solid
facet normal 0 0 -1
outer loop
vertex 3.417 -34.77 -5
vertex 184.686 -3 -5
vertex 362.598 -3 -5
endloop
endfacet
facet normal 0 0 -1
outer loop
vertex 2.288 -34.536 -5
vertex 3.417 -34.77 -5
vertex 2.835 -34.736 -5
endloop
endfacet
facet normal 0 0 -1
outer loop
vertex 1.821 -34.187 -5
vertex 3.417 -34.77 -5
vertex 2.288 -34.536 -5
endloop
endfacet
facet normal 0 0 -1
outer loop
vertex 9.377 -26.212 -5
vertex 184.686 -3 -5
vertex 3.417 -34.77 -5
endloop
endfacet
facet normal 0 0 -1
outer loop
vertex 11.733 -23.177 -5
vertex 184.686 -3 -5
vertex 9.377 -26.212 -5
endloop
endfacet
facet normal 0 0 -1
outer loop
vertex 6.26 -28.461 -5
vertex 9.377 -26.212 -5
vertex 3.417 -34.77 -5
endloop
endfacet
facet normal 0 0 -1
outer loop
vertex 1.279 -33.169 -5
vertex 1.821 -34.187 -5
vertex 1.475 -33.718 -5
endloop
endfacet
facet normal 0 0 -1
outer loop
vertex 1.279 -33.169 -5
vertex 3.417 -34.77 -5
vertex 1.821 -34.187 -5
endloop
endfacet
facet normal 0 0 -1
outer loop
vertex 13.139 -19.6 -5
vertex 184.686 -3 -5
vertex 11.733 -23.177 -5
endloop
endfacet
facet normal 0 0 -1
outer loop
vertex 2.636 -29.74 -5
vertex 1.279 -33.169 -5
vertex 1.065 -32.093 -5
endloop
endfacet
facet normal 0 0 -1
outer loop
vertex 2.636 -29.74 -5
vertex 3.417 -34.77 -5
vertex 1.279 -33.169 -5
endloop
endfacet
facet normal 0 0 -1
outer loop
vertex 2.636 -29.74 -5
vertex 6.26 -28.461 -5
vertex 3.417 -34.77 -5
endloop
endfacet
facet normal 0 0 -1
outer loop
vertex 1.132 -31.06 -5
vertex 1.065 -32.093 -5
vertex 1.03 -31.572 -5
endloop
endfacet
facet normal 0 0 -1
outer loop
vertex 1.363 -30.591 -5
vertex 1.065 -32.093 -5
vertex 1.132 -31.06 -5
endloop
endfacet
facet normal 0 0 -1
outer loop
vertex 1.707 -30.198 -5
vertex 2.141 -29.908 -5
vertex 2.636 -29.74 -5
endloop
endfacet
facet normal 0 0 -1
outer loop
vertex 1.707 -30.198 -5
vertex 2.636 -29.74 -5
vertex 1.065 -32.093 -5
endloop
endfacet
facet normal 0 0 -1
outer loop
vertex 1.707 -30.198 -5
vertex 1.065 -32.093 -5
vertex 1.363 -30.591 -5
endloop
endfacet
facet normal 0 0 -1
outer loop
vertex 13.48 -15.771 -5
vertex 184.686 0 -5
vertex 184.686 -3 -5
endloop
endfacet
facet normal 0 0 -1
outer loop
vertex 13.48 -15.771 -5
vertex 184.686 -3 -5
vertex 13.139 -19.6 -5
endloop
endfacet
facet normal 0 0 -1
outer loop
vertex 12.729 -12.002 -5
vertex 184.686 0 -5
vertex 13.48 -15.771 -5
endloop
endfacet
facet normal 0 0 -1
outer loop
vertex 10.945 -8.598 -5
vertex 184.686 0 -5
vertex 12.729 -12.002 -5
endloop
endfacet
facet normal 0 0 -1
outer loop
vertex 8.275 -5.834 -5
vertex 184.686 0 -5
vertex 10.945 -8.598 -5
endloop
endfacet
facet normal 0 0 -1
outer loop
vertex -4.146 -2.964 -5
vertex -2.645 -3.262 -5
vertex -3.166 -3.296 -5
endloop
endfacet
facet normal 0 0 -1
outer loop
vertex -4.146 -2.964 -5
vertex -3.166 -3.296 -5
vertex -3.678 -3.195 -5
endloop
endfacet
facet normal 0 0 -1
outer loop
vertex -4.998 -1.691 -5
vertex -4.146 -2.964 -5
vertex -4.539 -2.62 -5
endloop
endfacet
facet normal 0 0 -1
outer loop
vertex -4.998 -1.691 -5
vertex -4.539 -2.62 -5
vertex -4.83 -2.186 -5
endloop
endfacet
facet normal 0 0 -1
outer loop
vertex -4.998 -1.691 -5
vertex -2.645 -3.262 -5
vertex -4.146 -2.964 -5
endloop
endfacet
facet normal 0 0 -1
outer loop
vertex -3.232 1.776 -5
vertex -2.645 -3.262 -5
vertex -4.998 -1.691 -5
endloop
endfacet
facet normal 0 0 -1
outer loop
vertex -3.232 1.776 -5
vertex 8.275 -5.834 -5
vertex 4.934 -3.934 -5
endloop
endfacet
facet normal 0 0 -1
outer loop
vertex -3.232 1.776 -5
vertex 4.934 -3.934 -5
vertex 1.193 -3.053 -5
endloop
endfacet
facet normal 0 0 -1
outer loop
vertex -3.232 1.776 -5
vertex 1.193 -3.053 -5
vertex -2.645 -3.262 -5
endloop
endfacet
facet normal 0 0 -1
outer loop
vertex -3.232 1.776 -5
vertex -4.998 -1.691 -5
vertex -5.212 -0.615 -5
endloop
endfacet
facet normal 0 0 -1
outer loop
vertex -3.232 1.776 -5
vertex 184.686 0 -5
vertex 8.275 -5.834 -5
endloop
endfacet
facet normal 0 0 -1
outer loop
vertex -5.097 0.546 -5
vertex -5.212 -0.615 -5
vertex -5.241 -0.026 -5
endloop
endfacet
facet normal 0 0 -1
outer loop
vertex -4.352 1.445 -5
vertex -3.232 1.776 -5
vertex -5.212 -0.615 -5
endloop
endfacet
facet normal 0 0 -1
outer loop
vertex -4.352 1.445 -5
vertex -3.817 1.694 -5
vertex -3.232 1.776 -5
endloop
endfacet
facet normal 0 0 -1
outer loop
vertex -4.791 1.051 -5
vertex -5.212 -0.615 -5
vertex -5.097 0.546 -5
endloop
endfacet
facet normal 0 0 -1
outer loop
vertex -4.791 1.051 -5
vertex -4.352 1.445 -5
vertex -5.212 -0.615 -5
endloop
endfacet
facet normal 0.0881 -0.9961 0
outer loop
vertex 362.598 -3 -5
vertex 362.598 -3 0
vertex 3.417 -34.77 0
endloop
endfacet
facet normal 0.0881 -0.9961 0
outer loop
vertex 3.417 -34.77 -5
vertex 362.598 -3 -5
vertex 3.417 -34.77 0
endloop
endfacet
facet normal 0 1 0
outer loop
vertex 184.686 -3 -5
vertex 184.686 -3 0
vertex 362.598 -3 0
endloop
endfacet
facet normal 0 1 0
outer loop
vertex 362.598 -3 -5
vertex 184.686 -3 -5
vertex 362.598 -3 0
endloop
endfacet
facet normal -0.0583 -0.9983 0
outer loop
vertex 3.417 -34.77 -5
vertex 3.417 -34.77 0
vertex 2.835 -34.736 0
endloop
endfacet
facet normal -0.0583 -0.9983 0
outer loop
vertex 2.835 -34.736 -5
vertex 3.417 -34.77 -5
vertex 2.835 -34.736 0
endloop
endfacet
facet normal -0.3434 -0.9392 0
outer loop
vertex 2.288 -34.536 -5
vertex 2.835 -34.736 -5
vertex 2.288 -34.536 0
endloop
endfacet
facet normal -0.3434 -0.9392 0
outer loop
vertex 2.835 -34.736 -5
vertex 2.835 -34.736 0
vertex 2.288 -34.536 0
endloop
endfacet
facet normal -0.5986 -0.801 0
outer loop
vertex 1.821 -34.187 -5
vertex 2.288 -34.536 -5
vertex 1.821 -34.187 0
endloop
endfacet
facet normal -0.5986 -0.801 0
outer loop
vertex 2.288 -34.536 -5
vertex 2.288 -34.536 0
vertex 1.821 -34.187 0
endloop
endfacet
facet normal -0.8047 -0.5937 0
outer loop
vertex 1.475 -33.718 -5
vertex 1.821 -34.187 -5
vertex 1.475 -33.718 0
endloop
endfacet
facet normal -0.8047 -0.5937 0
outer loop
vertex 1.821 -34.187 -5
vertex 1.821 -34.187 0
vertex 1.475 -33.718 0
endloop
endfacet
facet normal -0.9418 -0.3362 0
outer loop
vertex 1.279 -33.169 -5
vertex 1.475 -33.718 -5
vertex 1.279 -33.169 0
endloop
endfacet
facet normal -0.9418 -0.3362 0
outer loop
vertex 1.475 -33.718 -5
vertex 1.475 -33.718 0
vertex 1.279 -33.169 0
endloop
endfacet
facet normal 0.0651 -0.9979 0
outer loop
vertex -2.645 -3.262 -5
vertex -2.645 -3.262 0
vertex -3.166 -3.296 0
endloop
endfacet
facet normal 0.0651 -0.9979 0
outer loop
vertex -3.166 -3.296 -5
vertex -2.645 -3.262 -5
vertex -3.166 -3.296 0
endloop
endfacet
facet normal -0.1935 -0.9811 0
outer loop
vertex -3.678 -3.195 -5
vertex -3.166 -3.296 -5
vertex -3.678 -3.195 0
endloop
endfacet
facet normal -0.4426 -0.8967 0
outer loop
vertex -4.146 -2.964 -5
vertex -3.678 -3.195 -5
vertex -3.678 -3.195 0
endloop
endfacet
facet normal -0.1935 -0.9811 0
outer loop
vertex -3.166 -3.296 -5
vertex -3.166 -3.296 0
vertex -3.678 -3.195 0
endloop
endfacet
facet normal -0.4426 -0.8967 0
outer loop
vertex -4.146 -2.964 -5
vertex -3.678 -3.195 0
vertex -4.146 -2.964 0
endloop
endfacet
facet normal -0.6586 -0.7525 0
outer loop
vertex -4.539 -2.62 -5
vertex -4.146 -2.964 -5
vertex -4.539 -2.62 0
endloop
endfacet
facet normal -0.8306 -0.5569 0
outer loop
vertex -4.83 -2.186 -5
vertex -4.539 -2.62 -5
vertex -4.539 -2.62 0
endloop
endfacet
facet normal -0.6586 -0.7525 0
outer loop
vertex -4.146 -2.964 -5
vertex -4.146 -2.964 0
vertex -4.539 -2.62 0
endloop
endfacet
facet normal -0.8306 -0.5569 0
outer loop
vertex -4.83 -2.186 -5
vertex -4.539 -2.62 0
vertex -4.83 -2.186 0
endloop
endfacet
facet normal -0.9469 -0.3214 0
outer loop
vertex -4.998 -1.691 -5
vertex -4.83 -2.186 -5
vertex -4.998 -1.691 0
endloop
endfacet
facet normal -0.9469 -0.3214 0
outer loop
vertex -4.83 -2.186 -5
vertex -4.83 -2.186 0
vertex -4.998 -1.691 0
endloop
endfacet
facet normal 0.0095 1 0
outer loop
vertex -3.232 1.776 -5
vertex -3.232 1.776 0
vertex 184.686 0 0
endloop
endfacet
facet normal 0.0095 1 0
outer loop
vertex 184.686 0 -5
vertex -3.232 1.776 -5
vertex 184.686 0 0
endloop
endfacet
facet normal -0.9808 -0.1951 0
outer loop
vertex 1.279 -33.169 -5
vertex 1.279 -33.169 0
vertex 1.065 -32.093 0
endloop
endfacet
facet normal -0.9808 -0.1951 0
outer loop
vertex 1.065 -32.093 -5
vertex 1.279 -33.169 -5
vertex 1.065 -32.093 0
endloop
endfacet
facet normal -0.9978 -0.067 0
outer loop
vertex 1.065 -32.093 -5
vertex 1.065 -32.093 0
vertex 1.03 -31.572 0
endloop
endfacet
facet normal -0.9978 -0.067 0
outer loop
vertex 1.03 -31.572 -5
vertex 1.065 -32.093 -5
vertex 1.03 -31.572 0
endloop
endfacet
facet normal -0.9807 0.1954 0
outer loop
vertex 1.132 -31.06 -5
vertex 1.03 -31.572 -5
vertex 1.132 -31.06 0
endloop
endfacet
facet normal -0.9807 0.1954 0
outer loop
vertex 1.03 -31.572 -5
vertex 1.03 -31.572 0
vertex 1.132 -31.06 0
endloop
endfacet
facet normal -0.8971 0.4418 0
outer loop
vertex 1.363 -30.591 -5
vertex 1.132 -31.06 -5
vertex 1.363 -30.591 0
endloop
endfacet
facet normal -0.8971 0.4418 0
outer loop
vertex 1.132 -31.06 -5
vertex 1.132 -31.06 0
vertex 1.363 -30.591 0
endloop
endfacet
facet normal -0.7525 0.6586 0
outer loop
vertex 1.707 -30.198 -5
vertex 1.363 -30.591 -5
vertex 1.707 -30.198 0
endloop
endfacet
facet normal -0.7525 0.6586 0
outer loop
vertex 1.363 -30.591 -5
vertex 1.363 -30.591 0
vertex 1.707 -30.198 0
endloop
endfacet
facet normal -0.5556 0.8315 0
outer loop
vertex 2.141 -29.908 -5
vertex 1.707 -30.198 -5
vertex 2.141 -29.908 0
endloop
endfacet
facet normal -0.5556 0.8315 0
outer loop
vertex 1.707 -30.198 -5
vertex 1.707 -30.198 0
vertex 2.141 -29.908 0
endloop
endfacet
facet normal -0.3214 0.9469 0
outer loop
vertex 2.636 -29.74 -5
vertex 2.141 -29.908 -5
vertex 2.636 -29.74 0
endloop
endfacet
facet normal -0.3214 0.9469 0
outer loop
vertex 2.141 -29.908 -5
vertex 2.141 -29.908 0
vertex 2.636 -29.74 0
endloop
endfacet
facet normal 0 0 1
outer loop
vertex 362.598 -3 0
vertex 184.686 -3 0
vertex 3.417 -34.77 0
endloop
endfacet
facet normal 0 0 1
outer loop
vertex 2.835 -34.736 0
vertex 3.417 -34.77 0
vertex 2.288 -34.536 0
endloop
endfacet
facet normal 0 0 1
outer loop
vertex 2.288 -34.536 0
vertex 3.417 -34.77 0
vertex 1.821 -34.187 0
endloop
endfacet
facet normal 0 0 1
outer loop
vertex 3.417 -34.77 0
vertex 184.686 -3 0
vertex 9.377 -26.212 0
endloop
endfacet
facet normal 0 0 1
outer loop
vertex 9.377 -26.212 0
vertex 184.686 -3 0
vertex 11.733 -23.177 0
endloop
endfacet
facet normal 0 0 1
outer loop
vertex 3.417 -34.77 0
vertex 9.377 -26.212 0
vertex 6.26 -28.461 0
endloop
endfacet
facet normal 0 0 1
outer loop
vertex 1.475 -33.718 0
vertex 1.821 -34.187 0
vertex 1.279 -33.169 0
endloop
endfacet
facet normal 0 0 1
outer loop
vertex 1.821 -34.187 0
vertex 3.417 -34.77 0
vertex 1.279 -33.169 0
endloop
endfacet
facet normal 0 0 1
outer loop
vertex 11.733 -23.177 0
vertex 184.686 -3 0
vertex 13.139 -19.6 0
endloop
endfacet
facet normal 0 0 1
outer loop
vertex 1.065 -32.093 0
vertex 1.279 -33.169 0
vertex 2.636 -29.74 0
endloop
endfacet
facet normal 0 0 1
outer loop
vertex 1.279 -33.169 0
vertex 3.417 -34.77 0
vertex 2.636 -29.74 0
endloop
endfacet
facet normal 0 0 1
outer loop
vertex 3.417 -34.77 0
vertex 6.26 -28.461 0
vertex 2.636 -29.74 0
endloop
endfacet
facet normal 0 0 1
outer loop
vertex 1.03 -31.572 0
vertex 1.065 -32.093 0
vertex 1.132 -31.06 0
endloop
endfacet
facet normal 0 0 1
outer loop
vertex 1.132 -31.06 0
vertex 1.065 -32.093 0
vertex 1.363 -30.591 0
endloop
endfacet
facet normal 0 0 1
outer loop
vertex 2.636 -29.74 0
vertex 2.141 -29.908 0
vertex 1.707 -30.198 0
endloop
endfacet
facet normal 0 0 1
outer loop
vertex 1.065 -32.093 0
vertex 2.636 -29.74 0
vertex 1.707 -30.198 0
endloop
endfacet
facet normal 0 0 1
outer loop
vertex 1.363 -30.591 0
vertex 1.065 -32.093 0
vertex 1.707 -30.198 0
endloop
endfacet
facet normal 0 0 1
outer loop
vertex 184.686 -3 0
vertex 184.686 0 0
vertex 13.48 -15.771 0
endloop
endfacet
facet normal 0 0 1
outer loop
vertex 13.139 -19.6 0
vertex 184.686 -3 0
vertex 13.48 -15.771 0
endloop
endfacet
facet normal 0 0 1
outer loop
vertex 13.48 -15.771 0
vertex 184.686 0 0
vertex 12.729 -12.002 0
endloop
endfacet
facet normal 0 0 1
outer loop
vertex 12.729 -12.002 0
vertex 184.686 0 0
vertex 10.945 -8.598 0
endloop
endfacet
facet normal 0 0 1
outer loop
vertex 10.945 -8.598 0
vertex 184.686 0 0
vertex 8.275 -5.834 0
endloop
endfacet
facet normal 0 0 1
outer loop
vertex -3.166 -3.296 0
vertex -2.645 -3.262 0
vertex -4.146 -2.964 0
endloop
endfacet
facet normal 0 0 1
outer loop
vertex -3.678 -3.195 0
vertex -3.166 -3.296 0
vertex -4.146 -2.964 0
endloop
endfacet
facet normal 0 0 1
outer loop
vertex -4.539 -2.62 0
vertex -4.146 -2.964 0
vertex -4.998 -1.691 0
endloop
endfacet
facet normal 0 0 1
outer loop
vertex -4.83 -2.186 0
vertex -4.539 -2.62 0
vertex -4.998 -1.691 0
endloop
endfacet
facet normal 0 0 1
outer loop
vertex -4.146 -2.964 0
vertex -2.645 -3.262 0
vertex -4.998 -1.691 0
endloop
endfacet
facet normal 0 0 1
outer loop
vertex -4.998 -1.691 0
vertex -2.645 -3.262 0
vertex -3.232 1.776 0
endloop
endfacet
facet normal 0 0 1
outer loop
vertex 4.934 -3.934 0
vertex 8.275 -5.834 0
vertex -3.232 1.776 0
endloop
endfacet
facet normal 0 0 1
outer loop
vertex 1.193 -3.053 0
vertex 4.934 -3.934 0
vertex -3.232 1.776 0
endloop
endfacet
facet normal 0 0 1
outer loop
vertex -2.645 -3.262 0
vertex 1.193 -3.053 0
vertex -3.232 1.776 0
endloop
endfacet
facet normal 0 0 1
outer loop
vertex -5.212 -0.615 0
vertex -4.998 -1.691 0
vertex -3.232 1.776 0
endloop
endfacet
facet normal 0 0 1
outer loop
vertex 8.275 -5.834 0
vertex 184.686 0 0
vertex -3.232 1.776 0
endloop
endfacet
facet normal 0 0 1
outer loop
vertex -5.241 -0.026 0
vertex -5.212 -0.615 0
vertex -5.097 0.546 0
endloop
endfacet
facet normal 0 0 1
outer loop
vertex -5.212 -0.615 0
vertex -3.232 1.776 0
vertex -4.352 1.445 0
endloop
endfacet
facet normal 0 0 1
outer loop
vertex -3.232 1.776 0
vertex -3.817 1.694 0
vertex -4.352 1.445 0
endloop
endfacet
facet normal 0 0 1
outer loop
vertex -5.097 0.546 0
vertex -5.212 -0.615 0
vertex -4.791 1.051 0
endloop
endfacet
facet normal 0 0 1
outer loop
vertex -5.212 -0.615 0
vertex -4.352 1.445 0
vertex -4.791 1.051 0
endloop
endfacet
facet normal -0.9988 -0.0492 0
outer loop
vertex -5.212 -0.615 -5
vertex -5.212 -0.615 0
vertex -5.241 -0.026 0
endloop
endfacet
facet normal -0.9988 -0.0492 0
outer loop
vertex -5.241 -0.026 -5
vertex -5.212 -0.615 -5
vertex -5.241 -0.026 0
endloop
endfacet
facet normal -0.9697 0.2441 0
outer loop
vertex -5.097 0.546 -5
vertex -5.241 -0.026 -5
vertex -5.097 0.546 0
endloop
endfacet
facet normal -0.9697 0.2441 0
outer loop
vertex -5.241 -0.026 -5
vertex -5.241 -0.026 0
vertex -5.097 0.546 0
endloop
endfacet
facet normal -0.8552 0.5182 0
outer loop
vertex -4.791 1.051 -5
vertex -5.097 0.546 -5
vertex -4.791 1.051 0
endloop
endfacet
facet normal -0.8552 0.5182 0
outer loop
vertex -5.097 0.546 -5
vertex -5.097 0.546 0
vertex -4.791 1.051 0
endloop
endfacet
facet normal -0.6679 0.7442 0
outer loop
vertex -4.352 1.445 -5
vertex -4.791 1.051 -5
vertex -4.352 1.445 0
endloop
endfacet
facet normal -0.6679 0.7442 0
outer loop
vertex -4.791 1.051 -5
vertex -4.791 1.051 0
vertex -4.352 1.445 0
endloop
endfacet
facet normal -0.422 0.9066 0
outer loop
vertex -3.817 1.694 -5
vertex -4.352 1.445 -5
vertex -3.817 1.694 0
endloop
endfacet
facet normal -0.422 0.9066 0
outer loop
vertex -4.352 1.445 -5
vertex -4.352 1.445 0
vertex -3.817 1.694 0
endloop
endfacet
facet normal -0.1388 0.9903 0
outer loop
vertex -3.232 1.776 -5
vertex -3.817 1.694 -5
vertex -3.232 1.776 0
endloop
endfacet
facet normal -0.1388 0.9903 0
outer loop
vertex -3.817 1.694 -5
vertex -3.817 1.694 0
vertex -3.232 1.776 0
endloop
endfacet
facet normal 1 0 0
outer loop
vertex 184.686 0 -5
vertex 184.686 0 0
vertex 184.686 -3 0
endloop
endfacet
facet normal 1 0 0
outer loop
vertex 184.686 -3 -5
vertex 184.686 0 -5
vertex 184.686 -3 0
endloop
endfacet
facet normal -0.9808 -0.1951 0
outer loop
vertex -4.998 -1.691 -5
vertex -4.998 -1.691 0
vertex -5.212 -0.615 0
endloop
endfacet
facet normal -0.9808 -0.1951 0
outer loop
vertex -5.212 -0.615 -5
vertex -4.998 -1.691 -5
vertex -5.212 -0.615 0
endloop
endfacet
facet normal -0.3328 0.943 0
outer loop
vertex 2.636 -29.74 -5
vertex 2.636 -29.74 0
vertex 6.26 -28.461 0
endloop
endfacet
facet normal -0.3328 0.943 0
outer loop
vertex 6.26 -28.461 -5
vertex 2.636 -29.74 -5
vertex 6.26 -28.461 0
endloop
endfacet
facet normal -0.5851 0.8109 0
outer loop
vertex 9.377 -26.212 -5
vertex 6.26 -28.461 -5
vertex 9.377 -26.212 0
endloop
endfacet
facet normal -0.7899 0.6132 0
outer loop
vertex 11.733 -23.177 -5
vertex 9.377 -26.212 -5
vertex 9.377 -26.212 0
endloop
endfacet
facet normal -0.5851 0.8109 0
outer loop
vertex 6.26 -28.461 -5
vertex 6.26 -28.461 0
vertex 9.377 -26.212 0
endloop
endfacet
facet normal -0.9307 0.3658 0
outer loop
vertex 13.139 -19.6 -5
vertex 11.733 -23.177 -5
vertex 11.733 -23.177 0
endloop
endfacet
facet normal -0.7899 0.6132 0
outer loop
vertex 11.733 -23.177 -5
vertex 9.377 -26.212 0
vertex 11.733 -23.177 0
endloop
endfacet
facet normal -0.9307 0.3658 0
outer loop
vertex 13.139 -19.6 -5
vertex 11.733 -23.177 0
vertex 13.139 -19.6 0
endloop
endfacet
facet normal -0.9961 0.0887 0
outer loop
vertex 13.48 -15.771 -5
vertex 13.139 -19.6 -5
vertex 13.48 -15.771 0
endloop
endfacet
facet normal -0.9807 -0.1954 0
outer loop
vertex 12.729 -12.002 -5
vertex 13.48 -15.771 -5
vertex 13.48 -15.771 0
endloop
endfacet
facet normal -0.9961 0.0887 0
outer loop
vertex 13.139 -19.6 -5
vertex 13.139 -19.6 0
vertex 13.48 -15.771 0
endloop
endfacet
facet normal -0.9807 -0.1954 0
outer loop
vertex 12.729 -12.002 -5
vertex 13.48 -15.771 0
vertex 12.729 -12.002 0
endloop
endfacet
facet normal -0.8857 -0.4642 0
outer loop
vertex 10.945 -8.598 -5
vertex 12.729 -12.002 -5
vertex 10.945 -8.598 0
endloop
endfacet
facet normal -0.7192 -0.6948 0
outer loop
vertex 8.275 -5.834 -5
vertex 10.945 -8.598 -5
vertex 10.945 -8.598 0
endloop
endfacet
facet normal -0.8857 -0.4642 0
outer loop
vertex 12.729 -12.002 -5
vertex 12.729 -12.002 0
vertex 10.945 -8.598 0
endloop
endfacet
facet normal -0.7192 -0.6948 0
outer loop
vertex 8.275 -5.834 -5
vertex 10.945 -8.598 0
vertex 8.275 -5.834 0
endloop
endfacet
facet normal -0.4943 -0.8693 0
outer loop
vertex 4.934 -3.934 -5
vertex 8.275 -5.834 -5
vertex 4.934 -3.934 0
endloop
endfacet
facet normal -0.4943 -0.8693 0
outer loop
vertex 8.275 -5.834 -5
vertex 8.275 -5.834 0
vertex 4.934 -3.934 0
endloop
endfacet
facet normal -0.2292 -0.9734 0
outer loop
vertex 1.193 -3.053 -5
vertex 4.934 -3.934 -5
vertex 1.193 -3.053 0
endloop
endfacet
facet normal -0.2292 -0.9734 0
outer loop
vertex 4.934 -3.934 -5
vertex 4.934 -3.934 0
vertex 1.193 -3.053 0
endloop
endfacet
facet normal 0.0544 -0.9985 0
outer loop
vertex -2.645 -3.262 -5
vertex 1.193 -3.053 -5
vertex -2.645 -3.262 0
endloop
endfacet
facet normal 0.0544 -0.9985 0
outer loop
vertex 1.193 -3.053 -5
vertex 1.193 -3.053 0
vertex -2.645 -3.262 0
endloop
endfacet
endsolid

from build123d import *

# Parameters (mm, degrees)
SM_BASE_FLANGE_1_DEPTH = 5


# Sheet-metal steps are written as plain solids
with BuildPart() as part:
    # Sketch 1 → Базовая кромка1 (new body)
    with BuildSketch(Plane.XY):
        with BuildLine():
            Line((1.279191503, -33.168907268), (1.064618958, -32.092874536))
            ThreePointArc((1.064618958, -32.092874536), (1.362719913, -30.59112672), (2.635550334, -29.740236948))
            ThreePointArc((2.635550334, -29.740236948), (13.239337122, -13.859933227), (-2.644582905, -3.261564244))
            ThreePointArc((-2.644582905, -3.261564244), (-4.146432324, -2.963975592), (-4.997756242, -1.691435506))
            Line((-4.997756242, -1.691435506), (-5.212328788, -0.615402774))
            ThreePointArc((-5.212328788, -0.615402774), (-4.791260853, 1.051425345), (-3.232048448, 1.775628952))
            Line((-3.232048448, 1.775628952), (184.68601887, 0))
            Line((184.68601887, 0), (184.68601887, -3))
            Line((184.68601887, -3), (362.597814819, -3))
            Line((362.597814819, -3), (3.416789292, -34.770008252))
            ThreePointArc((3.416789292, -34.770008252), (2.041580213, -34.378539846), (1.279191503, -33.168907268))
        make_face()
    extrude(amount=-SM_BASE_FLANGE_1_DEPTH)


solid = part.part
